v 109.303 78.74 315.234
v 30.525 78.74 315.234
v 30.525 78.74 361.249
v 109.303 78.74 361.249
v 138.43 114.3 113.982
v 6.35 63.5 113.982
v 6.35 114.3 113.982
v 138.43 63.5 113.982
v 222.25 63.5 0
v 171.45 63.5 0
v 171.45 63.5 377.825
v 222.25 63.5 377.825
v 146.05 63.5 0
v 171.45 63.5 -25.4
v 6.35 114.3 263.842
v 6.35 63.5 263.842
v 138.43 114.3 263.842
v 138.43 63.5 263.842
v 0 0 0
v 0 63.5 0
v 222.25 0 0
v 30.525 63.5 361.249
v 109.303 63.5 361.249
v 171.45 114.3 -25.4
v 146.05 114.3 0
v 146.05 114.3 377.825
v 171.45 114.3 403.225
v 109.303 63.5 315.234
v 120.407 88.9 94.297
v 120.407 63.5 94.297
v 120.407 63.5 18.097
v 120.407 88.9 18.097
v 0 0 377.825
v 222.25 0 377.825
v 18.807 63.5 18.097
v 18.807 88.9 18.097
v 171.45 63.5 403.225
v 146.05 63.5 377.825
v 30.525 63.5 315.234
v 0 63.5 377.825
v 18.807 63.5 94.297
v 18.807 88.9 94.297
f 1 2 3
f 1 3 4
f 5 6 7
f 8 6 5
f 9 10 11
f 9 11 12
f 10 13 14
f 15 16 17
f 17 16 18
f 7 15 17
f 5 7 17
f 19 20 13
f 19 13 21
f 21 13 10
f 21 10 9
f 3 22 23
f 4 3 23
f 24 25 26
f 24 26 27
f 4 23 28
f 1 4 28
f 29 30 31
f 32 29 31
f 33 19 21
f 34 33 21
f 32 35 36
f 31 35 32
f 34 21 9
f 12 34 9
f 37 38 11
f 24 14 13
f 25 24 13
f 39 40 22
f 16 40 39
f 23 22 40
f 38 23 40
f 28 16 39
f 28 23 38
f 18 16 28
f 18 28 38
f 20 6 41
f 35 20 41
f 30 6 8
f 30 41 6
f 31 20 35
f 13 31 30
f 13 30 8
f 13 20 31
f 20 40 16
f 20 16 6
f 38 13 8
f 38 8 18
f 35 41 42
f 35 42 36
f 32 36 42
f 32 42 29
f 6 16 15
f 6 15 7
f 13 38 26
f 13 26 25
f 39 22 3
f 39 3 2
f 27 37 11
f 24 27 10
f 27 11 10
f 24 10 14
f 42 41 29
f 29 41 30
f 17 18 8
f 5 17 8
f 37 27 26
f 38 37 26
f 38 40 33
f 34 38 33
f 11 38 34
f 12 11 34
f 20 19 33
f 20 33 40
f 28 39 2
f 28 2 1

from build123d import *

# Parameters (mm, degrees)
SKETCH1_W           = 222.25
SKETCH1_H           = 63.5
BOSS_EXTRUDE1_DEPTH = 377.825
SKETCH2_W           = 25.4
SKETCH2_H           = 428.625
BOSS_EXTRUDE2_DEPTH = 50.8
SKETCH3_W           = 132.08
SKETCH3_H           = 149.86
BOSS_EXTRUDE3_DEPTH = 50.8
SKETCH4_W           = 101.6
SKETCH4_H           = 76.2
BOSS_EXTRUDE4_DEPTH = 25.4
SKETCH5_W           = 78.778649954
SKETCH5_H           = 46.015700821
BOSS_EXTRUDE5_DEPTH = 15.24
CUT_EXTRUDE1_DEPTH  = 127


with BuildPart() as part:
    # Sketch1 → Boss-Extrude1 (new body)
    with BuildSketch(Plane.XY):
        with Locations((111.125, 31.75)):
            Rectangle(SKETCH1_W, SKETCH1_H)
    extrude(amount=BOSS_EXTRUDE1_DEPTH)

    # Sketch2 → Boss-Extrude2 (add)
    with BuildSketch(Plane(origin=(0, 63.5, 0), x_dir=(1, 0, 0), z_dir=(0, 1, 0))):
        with Locations((158.75, -188.9125)):
            Rectangle(SKETCH2_W, SKETCH2_H)
    extrude(amount=BOSS_EXTRUDE2_DEPTH)

    # Sketch3 → Boss-Extrude3 (add)
    with BuildSketch(Plane(origin=(0, 63.5, 0), x_dir=(1, 0, 0), z_dir=(0, 1, 0))):
        with Locations((72.39, -188.9125)):
            Rectangle(SKETCH3_W, SKETCH3_H)
    extrude(amount=BOSS_EXTRUDE3_DEPTH)

    # Sketch4 → Boss-Extrude4 (add)
    with BuildSketch(Plane(origin=(0, 63.5, 0), x_dir=(1, 0, 0), z_dir=(0, 1, 0))):
        with Locations((69.606671705, -56.197197529)):
            Rectangle(SKETCH4_W, SKETCH4_H)
    extrude(amount=BOSS_EXTRUDE4_DEPTH)

    # Sketch5 → Boss-Extrude5 (add)
    with BuildSketch(Plane(origin=(0, 63.5, 0), x_dir=(1, 0, 0), z_dir=(0, 1, 0))):
        with Locations((69.91393095, -338.241458835)):
            Rectangle(SKETCH5_W, SKETCH5_H)
    extrude(amount=BOSS_EXTRUDE5_DEPTH)

    # Sketch8 → Cut-Extrude1 (cut)
    with BuildSketch(Plane(origin=(0, 114.3, 0), x_dir=(1, 0, 0), z_dir=(0, 1, 0))):
        Polygon((171.45, 25.4), (146.05, 0), (146.05, 25.4), align=None)
        Polygon((171.45, -403.225), (146.05, -377.825), (146.05, -403.225), align=None)
    extrude(amount=-CUT_EXTRUDE1_DEPTH, mode=Mode.SUBTRACT)


solid = part.part
